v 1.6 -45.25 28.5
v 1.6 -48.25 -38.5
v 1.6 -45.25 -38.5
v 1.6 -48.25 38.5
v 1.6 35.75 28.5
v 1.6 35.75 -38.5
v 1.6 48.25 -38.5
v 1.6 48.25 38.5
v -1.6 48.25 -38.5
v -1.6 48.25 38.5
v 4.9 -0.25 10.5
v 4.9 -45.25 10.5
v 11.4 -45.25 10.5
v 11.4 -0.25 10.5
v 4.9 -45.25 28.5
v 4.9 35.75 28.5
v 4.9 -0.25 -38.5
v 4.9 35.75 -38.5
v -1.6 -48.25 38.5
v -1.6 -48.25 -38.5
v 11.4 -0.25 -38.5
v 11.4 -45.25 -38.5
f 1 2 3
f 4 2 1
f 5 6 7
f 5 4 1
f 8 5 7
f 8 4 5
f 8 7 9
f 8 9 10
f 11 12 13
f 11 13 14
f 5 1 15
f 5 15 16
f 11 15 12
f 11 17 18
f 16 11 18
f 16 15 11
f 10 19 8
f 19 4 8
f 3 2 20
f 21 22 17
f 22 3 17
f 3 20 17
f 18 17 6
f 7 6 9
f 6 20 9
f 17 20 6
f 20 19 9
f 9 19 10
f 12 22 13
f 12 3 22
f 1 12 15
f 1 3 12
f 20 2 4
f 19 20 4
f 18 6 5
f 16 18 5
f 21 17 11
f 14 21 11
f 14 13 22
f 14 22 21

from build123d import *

# Parameters (mm, degrees)
F0_W     = 96.5
F0_H     = 77
F1_DEPTH = 1.6
F2_W     = 81
F2_H     = 67
F3_DEPTH = 3.3
F4_W     = 45
F4_H     = 49
F5_DEPTH = 6.5


with BuildPart() as f1:
    # F0 (on Right) → F1 (new body, symmetric)
    with BuildSketch(Plane.YZ):
        Rectangle(F0_W, F0_H)
    extrude(amount=F1_DEPTH, both=True)

    # F2 (on face) → F3 (join)
    with BuildSketch(Plane.YZ.offset(1.6)):
        with Locations((-4.75, -5)):
            Rectangle(F2_W, F2_H)
    extrude(amount=F3_DEPTH)

    # F4 (on face) → F5 (join)
    with BuildSketch(Plane.YZ.offset(4.9)):
        with Locations((-22.75, -14)):
            Rectangle(F4_W, F4_H)
    extrude(amount=F5_DEPTH)


solid = f1.part
